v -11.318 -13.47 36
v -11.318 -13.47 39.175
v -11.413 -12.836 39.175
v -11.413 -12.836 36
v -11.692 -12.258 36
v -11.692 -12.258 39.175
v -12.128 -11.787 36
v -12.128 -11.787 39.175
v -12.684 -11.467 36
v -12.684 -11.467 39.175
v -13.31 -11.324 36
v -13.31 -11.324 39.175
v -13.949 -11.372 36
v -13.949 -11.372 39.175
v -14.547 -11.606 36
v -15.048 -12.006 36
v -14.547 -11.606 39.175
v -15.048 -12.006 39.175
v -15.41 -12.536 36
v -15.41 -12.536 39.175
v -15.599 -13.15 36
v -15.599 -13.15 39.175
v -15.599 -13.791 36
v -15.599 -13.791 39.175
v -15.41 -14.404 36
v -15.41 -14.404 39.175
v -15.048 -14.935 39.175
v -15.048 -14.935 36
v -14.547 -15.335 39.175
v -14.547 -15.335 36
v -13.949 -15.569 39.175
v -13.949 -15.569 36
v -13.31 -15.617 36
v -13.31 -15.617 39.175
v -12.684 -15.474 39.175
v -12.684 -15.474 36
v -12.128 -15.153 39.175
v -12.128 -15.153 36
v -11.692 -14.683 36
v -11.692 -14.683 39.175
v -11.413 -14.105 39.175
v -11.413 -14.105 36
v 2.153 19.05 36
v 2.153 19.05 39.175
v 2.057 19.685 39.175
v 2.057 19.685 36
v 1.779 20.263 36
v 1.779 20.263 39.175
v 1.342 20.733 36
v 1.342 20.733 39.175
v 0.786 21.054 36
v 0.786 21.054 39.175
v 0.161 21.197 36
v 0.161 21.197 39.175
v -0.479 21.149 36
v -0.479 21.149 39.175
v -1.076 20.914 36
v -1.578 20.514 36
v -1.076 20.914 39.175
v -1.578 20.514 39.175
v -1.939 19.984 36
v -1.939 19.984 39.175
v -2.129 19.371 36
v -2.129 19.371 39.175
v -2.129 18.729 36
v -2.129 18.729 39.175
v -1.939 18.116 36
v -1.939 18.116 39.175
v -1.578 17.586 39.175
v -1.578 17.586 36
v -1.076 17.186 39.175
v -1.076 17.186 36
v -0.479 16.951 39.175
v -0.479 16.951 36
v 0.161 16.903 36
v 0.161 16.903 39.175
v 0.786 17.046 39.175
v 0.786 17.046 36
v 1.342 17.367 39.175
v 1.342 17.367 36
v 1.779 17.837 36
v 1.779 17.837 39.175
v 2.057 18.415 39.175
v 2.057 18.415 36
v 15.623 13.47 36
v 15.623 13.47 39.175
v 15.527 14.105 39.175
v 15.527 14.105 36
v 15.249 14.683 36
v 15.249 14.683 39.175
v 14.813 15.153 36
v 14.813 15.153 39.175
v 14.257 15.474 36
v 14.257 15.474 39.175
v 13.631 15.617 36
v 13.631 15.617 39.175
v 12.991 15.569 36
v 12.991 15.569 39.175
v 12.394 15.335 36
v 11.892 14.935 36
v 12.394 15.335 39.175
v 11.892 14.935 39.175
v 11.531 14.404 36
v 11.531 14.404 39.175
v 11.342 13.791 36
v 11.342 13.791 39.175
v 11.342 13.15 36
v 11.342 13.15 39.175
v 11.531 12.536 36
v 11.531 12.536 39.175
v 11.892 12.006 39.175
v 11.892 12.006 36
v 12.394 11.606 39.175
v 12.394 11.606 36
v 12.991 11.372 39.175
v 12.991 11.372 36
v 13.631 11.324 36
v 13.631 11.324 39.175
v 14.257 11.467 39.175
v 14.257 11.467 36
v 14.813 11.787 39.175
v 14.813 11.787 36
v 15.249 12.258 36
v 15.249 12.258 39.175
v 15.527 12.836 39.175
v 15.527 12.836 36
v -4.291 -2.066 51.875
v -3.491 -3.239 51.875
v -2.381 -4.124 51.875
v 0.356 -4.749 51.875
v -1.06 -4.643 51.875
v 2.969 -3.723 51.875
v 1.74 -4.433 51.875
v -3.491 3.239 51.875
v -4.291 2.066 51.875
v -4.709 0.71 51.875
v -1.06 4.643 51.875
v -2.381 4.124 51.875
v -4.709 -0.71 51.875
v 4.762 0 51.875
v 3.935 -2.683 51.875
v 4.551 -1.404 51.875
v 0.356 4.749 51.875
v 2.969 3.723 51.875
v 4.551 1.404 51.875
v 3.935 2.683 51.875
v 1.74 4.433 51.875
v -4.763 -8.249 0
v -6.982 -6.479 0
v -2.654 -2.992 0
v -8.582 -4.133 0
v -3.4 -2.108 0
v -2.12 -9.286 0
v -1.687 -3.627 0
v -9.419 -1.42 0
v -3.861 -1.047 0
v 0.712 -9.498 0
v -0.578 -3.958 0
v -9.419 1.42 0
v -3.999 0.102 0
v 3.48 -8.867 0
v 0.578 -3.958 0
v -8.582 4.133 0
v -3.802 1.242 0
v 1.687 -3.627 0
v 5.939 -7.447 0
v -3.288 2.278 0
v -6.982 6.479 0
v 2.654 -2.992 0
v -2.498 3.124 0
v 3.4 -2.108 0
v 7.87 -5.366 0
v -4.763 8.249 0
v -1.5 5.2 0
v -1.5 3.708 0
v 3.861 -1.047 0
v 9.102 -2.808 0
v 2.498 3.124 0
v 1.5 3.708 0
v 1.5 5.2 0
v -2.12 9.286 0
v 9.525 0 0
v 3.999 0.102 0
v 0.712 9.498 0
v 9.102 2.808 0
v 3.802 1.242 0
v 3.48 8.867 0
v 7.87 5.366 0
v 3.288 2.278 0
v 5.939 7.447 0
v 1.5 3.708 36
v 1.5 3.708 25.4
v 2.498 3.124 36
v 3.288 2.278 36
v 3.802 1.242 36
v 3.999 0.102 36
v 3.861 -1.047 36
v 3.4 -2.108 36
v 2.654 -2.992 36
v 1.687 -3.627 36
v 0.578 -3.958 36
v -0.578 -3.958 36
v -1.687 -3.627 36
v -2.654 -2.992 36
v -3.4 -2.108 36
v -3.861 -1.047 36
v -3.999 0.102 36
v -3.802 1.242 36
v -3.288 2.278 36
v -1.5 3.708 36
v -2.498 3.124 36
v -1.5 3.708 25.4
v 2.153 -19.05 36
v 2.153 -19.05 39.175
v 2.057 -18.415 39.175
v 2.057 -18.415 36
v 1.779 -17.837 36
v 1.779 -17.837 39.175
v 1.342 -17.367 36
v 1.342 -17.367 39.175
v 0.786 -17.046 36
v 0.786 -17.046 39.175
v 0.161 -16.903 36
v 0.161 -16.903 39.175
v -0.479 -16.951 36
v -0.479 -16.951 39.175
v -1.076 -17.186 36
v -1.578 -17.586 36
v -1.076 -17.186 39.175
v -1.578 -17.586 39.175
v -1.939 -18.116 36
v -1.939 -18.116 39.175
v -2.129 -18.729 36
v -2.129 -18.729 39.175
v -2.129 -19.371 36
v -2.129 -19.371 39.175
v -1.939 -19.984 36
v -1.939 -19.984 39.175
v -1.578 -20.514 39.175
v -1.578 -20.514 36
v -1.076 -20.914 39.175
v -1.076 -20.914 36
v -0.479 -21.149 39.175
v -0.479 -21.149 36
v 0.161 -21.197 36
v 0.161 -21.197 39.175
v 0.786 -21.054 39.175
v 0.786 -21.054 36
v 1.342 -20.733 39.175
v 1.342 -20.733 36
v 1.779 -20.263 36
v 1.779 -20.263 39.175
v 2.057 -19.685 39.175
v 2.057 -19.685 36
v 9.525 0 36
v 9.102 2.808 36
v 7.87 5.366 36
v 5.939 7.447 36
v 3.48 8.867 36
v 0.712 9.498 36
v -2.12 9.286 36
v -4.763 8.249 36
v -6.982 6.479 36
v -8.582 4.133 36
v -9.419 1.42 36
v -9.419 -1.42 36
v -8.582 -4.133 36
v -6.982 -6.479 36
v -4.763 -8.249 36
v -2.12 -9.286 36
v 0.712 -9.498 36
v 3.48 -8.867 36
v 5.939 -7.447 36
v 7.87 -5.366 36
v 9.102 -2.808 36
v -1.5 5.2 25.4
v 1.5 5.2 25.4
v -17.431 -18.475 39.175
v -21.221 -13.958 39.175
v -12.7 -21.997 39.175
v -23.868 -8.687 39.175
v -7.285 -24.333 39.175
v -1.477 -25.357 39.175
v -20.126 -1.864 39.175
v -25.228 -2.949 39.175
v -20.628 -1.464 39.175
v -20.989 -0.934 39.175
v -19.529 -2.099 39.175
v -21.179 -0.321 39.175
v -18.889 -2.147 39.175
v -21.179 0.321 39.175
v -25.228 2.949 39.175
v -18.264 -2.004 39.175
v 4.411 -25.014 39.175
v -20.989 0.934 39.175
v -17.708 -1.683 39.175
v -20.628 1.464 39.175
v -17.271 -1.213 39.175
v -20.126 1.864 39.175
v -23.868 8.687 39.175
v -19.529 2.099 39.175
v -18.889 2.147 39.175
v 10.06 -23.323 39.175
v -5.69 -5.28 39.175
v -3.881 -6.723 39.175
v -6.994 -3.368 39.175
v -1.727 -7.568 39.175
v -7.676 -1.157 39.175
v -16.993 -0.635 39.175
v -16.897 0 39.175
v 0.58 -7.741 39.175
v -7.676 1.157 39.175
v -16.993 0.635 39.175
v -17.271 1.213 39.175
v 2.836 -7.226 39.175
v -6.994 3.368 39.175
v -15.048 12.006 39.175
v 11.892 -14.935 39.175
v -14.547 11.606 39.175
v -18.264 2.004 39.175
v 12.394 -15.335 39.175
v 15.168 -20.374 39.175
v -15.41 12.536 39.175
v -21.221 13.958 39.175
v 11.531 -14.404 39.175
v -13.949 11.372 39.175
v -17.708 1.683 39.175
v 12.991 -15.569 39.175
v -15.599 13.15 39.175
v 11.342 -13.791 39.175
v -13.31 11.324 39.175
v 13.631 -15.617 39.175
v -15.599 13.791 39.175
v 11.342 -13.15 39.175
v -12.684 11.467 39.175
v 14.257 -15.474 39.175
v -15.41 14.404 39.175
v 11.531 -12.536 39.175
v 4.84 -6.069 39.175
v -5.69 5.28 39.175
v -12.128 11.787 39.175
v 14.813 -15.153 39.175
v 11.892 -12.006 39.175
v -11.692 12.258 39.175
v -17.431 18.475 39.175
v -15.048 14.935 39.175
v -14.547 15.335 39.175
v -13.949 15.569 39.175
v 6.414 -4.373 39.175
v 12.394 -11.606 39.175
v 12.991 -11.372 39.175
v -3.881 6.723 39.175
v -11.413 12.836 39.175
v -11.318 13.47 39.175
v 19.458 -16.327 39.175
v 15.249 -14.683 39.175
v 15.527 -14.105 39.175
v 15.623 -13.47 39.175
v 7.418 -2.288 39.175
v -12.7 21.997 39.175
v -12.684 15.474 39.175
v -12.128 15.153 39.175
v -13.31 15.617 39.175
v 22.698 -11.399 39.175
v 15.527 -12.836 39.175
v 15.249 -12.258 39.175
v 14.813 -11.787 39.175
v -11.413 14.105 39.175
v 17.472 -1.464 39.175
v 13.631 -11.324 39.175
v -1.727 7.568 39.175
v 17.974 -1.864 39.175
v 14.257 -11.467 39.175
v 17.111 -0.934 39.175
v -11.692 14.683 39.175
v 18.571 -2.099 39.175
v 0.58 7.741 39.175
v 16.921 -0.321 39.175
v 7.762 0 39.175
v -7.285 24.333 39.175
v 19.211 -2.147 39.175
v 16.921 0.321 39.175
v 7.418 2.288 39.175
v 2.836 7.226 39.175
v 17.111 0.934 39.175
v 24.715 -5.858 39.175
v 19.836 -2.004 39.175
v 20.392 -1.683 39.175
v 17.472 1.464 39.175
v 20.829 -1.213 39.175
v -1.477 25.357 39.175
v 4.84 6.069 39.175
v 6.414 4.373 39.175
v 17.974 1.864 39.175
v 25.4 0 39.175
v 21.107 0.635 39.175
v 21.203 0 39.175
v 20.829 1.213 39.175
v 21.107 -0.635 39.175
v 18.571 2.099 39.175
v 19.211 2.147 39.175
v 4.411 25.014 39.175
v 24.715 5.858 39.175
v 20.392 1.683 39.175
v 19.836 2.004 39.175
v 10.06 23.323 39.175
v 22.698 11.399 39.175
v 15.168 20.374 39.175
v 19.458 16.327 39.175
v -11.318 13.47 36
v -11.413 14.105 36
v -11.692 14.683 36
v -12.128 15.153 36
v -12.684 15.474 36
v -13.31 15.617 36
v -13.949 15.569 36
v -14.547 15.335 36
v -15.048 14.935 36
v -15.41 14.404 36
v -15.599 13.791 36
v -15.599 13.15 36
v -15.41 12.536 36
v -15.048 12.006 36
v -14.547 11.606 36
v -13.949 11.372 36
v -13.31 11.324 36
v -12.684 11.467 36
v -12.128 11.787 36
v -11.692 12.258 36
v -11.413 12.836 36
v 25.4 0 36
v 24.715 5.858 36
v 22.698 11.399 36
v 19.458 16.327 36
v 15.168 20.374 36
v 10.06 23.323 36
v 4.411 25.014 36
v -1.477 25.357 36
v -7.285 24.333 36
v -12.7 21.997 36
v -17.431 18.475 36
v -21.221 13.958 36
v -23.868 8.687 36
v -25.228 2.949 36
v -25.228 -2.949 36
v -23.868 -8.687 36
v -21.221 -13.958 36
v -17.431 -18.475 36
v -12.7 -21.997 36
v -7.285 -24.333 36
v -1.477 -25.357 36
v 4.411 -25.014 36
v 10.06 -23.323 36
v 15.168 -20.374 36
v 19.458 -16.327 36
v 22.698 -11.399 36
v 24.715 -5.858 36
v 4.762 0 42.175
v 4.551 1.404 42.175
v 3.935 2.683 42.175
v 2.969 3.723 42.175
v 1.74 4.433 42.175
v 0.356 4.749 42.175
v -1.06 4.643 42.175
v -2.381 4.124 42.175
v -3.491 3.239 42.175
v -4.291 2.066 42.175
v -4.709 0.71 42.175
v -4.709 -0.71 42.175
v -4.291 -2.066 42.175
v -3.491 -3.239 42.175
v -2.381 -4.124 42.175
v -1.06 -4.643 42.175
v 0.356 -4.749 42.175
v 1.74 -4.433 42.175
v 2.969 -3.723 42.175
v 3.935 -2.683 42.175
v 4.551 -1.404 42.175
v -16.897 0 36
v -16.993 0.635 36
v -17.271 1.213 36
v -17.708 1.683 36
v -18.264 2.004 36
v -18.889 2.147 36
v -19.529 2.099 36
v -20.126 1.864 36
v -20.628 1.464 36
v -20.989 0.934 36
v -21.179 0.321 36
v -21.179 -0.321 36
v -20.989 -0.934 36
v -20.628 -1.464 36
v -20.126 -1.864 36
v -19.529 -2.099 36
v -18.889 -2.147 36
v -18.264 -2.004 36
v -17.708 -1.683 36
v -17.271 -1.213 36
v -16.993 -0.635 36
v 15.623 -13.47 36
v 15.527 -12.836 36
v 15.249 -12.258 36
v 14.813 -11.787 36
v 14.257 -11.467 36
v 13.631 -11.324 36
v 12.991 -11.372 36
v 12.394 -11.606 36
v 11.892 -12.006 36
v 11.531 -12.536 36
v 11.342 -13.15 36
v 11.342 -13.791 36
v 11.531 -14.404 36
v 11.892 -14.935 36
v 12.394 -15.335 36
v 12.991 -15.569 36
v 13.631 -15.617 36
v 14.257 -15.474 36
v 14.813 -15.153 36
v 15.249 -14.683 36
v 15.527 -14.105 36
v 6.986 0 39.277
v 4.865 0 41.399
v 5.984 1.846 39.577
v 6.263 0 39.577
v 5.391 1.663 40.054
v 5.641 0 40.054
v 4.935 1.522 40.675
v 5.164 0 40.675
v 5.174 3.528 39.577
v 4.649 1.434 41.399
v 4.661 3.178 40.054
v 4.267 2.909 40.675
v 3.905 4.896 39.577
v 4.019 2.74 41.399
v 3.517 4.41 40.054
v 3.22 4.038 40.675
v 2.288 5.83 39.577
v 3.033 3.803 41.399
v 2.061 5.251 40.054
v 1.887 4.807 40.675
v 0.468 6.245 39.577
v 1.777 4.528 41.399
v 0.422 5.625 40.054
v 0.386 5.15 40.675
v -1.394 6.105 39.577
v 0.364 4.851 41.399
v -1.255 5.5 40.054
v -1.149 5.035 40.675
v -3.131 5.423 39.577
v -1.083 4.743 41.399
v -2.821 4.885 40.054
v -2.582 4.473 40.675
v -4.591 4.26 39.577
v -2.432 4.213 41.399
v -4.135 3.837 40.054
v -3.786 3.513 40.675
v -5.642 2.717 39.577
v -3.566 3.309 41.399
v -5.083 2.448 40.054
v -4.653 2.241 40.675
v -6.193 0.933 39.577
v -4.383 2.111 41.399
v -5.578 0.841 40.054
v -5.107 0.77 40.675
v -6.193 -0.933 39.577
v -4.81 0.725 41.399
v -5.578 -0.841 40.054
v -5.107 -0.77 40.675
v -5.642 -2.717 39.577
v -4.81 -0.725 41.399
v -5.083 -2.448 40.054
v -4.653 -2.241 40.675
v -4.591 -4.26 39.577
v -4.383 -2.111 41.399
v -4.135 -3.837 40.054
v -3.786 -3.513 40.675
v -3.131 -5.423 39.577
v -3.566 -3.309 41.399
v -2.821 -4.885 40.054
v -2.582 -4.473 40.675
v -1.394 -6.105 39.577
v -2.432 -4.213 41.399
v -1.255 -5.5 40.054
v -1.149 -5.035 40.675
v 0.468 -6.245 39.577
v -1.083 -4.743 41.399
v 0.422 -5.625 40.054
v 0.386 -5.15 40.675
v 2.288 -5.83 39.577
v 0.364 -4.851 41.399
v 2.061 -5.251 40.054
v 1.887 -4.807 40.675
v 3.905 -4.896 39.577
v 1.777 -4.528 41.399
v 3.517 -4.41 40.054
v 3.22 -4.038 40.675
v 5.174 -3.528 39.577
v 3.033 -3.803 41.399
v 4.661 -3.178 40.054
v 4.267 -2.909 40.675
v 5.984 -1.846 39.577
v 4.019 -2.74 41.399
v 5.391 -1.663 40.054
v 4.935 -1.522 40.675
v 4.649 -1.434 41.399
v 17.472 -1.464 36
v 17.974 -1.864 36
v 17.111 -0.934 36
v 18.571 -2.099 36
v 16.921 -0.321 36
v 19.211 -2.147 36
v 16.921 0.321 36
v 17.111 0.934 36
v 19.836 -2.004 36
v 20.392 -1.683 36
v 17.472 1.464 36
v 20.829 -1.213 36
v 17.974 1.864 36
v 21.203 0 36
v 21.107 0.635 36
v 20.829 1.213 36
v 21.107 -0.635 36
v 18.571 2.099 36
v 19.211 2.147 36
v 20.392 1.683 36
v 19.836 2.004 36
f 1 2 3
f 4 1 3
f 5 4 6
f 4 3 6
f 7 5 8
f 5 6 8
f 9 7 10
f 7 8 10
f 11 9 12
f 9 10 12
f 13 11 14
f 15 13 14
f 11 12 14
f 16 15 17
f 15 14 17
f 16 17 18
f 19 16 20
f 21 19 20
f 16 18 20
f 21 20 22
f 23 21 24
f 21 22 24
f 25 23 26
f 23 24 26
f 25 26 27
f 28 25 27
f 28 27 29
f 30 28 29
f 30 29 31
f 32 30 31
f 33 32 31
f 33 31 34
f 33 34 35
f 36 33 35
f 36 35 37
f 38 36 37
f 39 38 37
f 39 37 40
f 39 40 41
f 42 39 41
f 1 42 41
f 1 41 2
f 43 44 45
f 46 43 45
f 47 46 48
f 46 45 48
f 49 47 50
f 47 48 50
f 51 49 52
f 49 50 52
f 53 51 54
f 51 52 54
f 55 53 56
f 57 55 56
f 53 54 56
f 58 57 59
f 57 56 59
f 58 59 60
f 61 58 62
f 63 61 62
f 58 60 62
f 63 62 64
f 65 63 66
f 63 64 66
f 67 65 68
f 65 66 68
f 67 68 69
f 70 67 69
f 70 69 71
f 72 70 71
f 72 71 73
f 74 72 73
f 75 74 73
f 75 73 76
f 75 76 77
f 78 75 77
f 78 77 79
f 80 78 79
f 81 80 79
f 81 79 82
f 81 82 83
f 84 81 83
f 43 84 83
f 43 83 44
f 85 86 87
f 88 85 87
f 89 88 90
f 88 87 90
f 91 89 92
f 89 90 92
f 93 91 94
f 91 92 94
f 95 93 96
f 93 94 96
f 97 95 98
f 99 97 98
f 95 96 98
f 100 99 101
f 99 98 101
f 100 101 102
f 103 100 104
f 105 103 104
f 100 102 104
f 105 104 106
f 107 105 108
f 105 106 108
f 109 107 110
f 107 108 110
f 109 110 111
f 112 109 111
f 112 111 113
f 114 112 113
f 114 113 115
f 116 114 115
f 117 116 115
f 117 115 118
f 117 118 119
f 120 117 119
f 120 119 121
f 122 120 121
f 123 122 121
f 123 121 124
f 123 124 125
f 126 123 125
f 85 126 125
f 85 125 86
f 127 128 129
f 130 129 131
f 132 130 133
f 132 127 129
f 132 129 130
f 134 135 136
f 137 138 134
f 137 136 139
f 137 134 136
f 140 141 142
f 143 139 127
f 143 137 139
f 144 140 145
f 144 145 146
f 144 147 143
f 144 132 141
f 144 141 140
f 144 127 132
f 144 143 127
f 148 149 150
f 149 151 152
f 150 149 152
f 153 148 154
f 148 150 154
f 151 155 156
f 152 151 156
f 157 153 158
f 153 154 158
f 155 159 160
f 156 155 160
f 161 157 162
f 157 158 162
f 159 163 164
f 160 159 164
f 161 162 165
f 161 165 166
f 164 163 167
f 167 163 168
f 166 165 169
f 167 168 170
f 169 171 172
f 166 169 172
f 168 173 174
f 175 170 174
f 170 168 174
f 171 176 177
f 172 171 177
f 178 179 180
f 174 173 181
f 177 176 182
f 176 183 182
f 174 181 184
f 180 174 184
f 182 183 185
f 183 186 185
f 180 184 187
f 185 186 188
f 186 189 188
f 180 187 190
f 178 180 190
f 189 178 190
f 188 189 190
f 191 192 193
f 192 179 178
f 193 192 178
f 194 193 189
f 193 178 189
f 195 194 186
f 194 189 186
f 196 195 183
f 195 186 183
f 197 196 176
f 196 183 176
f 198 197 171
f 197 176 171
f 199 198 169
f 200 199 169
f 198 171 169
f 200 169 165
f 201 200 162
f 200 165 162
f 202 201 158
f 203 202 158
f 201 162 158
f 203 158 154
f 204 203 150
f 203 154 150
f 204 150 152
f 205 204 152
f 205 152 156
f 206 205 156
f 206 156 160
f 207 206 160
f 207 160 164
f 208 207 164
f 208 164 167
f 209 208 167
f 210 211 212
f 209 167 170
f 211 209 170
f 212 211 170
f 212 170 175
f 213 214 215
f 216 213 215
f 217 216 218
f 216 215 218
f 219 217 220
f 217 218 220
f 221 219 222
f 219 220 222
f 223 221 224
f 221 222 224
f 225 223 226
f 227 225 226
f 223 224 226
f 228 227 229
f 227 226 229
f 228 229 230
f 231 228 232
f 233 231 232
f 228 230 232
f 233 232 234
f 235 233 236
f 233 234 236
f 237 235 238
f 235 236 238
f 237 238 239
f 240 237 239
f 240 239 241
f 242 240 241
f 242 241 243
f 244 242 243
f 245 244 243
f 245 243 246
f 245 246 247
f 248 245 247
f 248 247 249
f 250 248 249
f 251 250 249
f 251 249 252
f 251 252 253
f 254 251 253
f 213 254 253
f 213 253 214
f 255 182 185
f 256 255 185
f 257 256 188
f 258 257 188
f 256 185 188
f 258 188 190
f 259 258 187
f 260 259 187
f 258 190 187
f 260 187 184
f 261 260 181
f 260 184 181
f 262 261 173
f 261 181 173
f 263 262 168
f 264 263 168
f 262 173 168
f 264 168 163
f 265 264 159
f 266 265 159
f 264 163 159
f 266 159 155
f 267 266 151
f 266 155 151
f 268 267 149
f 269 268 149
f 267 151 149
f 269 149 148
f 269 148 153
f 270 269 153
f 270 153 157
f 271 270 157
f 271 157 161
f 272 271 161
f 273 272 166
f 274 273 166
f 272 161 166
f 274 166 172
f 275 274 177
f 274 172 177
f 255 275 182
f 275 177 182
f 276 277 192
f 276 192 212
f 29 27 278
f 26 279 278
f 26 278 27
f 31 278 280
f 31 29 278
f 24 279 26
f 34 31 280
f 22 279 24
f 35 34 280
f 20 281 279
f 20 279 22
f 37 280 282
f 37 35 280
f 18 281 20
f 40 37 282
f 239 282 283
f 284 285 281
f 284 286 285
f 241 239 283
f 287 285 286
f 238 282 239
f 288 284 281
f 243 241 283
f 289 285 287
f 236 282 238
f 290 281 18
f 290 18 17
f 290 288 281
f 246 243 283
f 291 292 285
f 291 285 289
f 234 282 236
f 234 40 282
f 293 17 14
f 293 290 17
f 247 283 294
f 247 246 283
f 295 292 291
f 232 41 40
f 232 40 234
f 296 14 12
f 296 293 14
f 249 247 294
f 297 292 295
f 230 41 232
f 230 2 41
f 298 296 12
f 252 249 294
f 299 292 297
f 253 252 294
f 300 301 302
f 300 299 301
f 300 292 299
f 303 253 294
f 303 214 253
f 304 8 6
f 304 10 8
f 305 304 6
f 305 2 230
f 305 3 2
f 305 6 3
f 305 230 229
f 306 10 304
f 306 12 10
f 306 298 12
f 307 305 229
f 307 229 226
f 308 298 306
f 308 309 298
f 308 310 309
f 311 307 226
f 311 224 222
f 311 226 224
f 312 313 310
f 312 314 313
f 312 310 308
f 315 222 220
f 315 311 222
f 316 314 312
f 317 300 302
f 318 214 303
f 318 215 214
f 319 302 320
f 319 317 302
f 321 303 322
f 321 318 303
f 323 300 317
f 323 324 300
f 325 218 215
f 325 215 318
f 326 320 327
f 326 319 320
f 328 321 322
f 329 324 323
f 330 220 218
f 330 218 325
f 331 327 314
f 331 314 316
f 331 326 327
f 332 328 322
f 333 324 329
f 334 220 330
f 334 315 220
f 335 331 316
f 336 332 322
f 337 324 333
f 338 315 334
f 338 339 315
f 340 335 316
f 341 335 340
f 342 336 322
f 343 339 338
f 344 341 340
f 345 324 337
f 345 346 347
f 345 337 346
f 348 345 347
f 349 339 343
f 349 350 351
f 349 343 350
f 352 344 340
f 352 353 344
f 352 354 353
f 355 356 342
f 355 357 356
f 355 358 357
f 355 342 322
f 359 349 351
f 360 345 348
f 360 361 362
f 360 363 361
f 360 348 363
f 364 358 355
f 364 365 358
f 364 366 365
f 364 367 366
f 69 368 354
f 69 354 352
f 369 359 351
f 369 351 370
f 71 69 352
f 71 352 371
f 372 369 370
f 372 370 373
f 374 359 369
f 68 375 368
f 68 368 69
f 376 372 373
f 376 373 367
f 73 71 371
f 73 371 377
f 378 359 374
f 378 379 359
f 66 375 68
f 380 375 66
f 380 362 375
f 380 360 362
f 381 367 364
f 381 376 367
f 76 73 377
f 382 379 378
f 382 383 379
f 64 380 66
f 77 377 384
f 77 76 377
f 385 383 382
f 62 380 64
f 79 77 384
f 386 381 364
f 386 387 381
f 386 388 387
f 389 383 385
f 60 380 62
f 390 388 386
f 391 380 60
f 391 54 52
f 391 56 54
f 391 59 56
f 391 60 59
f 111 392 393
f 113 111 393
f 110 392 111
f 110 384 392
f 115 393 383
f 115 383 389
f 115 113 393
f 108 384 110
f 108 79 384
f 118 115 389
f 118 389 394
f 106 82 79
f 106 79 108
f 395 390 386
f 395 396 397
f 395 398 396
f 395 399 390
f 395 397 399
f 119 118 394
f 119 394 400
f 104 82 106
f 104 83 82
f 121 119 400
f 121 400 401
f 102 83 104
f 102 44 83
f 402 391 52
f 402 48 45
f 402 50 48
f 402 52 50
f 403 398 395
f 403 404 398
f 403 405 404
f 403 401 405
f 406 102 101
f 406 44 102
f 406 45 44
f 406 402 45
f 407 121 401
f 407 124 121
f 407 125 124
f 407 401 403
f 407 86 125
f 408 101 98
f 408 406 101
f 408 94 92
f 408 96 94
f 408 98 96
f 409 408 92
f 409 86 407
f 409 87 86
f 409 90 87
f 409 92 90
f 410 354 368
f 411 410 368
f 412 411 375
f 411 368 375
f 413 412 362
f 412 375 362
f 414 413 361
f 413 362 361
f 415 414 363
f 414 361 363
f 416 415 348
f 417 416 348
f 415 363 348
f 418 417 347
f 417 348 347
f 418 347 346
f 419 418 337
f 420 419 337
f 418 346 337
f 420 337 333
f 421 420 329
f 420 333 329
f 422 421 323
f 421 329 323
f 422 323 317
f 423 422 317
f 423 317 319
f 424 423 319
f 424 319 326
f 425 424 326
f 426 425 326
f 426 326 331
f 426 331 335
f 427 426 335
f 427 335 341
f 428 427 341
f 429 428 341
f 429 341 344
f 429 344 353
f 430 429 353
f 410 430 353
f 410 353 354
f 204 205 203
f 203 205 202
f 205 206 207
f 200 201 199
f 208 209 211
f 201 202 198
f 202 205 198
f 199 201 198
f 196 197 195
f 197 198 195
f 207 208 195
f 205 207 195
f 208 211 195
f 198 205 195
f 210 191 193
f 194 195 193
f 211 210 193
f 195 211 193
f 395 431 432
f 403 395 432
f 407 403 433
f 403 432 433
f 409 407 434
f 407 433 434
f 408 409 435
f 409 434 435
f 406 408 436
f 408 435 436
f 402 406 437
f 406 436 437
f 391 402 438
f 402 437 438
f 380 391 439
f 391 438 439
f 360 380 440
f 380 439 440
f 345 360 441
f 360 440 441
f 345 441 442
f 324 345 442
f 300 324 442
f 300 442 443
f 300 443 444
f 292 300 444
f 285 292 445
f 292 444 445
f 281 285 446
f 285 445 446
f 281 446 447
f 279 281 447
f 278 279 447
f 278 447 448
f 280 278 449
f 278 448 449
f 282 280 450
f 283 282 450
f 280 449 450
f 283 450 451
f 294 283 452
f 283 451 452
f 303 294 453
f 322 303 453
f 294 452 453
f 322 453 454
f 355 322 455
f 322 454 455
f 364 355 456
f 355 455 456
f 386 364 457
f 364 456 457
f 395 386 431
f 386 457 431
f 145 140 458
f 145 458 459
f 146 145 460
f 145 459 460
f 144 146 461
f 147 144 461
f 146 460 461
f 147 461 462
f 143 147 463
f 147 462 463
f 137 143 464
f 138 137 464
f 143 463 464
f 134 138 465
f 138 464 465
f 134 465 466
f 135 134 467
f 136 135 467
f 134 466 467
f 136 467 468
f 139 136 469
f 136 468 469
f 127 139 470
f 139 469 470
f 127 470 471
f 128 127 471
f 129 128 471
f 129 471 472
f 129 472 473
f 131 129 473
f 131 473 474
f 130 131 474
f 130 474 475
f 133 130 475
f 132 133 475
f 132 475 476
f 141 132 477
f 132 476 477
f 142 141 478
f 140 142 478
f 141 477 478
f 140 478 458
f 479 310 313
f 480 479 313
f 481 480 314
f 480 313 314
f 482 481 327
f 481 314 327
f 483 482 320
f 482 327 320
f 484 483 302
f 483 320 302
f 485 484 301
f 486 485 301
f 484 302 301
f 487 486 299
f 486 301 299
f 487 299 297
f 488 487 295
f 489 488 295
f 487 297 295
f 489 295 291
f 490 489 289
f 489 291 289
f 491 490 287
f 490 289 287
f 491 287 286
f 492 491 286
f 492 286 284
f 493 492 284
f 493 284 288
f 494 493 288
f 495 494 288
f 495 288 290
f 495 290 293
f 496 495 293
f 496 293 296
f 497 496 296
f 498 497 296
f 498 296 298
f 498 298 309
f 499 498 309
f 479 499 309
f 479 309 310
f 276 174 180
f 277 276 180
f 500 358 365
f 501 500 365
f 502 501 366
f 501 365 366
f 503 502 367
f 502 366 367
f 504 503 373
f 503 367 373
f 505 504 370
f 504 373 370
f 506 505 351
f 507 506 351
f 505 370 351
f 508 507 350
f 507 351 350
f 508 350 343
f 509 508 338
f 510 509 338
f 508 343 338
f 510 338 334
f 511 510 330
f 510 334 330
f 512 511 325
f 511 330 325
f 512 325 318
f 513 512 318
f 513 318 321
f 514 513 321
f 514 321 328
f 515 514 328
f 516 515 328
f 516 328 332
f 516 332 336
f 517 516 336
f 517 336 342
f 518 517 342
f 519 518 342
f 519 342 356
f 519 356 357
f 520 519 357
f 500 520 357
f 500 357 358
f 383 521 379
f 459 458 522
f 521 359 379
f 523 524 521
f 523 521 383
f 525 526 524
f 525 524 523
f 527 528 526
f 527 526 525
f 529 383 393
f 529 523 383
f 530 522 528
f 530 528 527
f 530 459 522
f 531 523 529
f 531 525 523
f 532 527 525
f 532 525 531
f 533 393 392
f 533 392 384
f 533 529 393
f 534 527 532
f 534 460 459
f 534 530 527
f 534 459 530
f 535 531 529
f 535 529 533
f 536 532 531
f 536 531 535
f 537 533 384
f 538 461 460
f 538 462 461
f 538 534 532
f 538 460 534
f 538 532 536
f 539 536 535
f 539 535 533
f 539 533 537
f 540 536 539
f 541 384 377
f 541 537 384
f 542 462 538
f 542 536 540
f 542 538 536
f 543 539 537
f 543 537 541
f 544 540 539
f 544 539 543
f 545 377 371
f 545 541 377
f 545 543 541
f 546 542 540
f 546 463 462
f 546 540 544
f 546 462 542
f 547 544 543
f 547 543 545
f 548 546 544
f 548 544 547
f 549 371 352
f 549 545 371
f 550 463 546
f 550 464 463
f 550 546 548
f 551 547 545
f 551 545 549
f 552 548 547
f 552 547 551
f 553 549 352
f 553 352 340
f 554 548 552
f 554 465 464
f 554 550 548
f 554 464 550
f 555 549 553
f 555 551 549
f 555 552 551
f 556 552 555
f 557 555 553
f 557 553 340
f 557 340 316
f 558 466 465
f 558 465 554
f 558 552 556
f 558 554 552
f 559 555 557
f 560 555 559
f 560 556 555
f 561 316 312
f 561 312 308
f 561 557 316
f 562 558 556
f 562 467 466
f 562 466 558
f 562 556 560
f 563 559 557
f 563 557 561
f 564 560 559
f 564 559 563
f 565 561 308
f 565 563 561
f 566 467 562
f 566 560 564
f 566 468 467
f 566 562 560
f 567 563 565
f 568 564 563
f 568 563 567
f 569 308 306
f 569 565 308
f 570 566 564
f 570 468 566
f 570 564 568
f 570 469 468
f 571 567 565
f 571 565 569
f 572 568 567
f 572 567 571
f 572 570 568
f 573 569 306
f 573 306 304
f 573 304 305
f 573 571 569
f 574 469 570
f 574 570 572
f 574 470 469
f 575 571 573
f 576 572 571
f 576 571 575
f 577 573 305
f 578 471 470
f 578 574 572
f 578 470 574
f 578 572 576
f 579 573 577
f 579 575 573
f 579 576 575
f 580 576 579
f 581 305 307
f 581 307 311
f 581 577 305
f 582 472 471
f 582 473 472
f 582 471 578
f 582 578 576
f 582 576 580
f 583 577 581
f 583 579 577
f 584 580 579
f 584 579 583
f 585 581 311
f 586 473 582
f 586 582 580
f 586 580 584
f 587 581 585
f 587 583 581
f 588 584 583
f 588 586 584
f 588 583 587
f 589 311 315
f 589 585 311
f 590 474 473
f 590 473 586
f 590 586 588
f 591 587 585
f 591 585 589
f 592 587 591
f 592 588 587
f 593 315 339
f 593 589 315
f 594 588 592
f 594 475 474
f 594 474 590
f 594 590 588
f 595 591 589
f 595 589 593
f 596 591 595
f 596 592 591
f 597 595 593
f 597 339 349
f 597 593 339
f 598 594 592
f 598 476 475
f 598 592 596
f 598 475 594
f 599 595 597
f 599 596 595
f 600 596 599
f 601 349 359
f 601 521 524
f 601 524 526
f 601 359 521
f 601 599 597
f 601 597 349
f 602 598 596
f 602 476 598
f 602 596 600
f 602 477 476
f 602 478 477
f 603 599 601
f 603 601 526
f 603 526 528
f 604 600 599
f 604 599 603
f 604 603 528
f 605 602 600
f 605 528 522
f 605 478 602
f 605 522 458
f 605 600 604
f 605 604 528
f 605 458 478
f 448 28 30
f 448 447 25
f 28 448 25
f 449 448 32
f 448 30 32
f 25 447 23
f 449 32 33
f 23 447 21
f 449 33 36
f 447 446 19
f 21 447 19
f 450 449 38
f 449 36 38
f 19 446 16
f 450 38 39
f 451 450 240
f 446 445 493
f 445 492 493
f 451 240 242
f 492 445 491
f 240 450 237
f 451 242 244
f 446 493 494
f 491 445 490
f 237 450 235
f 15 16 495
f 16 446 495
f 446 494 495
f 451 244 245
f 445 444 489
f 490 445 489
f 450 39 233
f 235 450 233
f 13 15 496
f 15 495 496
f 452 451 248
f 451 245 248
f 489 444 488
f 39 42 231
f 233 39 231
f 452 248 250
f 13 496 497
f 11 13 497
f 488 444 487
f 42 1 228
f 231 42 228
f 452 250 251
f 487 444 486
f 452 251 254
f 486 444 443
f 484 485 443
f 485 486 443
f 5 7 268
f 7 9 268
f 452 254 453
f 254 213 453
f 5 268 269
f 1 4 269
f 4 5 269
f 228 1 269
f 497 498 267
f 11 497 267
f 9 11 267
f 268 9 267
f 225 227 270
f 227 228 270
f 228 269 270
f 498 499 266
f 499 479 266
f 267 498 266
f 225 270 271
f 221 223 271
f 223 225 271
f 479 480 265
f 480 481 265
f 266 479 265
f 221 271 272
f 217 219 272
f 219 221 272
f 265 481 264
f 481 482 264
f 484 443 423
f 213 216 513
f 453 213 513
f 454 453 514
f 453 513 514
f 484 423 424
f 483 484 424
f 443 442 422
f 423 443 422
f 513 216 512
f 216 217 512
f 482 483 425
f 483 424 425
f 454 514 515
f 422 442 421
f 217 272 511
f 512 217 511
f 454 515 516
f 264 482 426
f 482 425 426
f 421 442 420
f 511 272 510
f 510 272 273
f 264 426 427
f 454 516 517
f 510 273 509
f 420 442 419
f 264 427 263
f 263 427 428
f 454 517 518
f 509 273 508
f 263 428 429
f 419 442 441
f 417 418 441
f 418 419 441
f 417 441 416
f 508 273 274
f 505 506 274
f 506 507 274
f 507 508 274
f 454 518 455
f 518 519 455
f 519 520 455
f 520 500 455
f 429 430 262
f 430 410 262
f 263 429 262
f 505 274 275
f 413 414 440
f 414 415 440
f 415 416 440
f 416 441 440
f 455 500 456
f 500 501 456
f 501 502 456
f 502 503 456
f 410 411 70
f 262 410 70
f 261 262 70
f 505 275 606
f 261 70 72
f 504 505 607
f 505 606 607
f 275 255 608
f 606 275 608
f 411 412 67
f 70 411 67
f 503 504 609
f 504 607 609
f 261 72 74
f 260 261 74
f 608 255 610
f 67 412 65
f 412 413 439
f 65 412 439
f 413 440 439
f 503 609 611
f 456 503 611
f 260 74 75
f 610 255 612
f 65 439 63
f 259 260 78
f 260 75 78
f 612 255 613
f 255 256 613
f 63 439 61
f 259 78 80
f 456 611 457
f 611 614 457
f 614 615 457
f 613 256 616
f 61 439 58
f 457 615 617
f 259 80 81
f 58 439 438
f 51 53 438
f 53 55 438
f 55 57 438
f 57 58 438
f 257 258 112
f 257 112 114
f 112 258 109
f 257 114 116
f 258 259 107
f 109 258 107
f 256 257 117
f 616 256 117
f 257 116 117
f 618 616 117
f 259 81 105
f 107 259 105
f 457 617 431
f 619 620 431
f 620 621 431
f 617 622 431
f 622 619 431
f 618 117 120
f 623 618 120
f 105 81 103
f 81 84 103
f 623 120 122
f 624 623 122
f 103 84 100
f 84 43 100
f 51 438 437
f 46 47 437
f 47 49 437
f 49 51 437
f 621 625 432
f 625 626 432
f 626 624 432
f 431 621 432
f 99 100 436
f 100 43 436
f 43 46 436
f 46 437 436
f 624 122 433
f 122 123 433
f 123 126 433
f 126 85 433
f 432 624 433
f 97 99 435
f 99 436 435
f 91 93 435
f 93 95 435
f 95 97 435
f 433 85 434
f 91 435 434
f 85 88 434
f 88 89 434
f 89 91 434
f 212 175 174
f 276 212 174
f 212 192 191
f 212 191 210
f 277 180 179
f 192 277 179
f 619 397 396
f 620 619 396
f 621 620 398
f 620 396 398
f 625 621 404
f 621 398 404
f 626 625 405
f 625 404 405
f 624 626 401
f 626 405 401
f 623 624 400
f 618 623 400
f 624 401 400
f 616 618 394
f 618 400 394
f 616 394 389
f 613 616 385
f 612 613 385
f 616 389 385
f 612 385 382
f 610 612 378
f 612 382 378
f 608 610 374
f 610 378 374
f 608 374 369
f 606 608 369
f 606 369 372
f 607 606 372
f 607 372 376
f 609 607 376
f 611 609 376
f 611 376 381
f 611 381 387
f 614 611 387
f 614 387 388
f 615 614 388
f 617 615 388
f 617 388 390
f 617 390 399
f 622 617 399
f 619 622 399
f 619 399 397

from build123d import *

# Parameters (mm, degrees)
SKETCH1_R           = 9.525
BOSS_EXTRUDE1_DEPTH = 36
SKETCH2_R           = 25.4
BOSS_EXTRUDE2_DEPTH = 3.175
SKETCH3_R           = 4.7625
BOSS_EXTRUDE3_DEPTH = 12.7
SKETCH4_R           = 2.15265
CUT_EXTRUDE1_DEPTH  = 19.05
FILLET1_R           = 3
SKETCH5_W           = 3
SKETCH5_H           = 1.491900756
BOSS_EXTRUDE4_DEPTH = 10.6


with BuildPart() as part:
    # Sketch1 → Boss-Extrude1 (new body)
    with BuildSketch(Plane.XY):
        Circle(SKETCH1_R)
        with BuildLine():
            Line((-1.5, 5.2), (1.5, 5.2))
            Line((1.5, 5.2), (1.5, 3.708099244))
            ThreePointArc((1.5, 3.708099244), (0, -4), (-1.5, 3.708099244))
            Line((-1.5, 3.708099244), (-1.5, 5.2))
        make_face(mode=Mode.SUBTRACT)
    extrude(amount=BOSS_EXTRUDE1_DEPTH)

    # Sketch2 → Boss-Extrude2 (add)
    with BuildSketch(Plane.XY.offset(36)):
        Circle(SKETCH2_R)
    extrude(amount=BOSS_EXTRUDE2_DEPTH)

    # Sketch3 → Boss-Extrude3 (add)
    with BuildSketch(Plane.XY.offset(39.175)):
        Circle(SKETCH3_R)
    extrude(amount=BOSS_EXTRUDE3_DEPTH)

    # Sketch4 → Cut-Extrude1 (cut)
    with BuildSketch(Plane.XY.offset(39.175)):
        with Locations((0, 19.05)):
            Circle(SKETCH4_R)
        with Locations((13.470384182, 13.470384182)):
            Circle(SKETCH4_R)
        with Locations((19.05, 0)):
            Circle(SKETCH4_R)
        with Locations((13.470384182, -13.470384182)):
            Circle(SKETCH4_R)
        with Locations((-19.05, 0)):
            Circle(SKETCH4_R)
        with Locations((0, -19.05)):
            Circle(SKETCH4_R)
        with Locations((-13.470384182, -13.470384182)):
            Circle(SKETCH4_R)
        with Locations((-13.470384182, 13.470384182)):
            Circle(SKETCH4_R)
    extrude(amount=-CUT_EXTRUDE1_DEPTH, mode=Mode.SUBTRACT)

    # Fillet1
    fillet1_edges = [part.edges().sort_by_distance(p)[0] for p in [
        (-4.7625, 0, 39.175),
    ]]
    fillet(fillet1_edges, radius=FILLET1_R)

    # Sketch5 → Boss-Extrude4 (add)
    with BuildSketch(Plane(origin=(0, 0, 36), x_dir=(-1, 0, 0), z_dir=(0, 0, -1))):
        with Locations((0, 4.454049622)):
            Rectangle(SKETCH5_W, SKETCH5_H)
    extrude(amount=BOSS_EXTRUDE4_DEPTH)


solid = part.part
